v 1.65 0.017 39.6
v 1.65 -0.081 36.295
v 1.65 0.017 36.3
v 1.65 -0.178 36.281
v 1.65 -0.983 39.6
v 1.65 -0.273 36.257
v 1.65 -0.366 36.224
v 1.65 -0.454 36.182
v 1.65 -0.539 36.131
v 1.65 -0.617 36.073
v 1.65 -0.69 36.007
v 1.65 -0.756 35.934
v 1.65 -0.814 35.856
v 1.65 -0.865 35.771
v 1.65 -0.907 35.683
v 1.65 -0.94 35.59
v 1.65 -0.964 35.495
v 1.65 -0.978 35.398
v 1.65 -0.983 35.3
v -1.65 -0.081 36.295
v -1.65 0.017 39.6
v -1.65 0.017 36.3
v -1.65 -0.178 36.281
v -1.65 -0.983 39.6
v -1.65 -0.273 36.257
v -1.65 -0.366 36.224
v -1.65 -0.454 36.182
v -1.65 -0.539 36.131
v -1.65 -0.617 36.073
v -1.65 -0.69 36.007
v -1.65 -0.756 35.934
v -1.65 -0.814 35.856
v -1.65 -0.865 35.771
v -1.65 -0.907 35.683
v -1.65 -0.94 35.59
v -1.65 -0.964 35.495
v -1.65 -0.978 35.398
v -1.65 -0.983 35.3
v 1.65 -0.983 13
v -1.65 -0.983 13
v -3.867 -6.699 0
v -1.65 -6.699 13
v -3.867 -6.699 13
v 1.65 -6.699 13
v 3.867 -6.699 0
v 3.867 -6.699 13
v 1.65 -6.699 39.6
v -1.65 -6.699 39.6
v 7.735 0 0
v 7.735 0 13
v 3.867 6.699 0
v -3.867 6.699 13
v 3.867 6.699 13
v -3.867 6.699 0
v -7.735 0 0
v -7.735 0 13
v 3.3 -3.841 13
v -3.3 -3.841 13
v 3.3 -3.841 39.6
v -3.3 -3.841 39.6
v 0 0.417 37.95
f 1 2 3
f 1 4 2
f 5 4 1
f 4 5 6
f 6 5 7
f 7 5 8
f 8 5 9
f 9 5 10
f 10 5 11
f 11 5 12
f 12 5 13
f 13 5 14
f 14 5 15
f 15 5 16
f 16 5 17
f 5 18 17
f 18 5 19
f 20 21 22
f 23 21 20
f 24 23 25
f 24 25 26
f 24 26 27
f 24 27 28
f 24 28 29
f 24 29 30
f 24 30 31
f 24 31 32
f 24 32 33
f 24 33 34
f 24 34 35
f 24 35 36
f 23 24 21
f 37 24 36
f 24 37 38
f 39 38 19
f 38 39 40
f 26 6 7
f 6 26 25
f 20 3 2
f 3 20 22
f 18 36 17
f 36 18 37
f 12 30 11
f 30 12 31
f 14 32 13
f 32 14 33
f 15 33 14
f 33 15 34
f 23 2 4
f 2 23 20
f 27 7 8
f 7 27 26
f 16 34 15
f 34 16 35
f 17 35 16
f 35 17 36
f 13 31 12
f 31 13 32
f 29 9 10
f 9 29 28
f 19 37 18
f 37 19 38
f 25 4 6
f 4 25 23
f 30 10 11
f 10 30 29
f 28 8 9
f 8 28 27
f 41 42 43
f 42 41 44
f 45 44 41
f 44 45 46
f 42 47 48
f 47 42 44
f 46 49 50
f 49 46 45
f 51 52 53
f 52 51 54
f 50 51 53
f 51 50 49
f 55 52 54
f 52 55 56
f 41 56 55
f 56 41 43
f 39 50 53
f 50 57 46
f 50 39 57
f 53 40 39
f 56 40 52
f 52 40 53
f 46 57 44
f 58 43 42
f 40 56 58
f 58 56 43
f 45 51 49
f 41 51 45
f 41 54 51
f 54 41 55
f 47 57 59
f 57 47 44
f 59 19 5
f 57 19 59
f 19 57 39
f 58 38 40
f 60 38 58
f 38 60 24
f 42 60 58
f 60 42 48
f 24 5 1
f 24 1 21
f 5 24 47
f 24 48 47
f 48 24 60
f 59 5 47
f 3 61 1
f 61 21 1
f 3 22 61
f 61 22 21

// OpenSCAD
/*
Parametric hook for HSW

Copyright 2024 nomike[AT]nomike[DOT]com

Redistribution and use in source and binary forms, with or without
modification, are permitted provided that the following conditions are met:

1. Redistributions of source code must retain the above copyright notice, this
list of conditions and the following disclaimer.

2. Redistributions in binary form must reproduce the above copyright notice,
this list of conditions and the following disclaimer in the documentation
and/or other materials provided with the distribution.

THIS SOFTWARE IS PROVIDED BY THE COPYRIGHT HOLDERS AND CONTRIBUTORS “AS IS” AND
ANY EXPRESS OR IMPLIED WARRANTIES, INCLUDING, BUT NOT LIMITED TO, THE IMPLIED
WARRANTIES OF MERCHANTABILITY AND FITNESS FOR A PARTICULAR PURPOSE ARE
DISCLAIMED. IN NO EVENT SHALL THE COPYRIGHT HOLDER OR CONTRIBUTORS BE LIABLE FOR
ANY DIRECT, INDIRECT, INCIDENTAL, SPECIAL, EXEMPLARY, OR CONSEQUENTIAL DAMAGES
(INCLUDING, BUT NOT LIMITED TO, PROCUREMENT OF SUBSTITUTE GOODS OR SERVICES;
LOSS OF USE, DATA, OR PROFITS; OR BUSINESS INTERRUPTION) HOWEVER CAUSED AND ON
ANY THEORY OF LIABILITY, WHETHER IN CONTRACT, STRICT LIABILITY, OR TORT
(INCLUDING NEGLIGENCE OR OTHERWISE) ARISING IN ANY WAY OUT OF THE USE OF THIS
SOFTWARE, EVEN IF ADVISED OF THE POSSIBILITY OF SUCH DAMAGE.
*/

insert_length = 13;
hook_length = 22.3;
hook_diameter = 6.6;
hook_nose_height = 1;
slope_height = 0.4;

_hook_total_length = hook_length + hook_diameter / 2 + hook_nose_height;


const_hsw_diameter = 15.47; // 15.15 mm hooks slide in and out with ease. 15.47 mm is quite tight.


_hsw_inner_circle_diameter = (sqrt(3) / 2) * const_hsw_diameter;
_hook_inner_circle_radius = (sqrt(3) / 2) * hook_diameter;
echo(_hsw_inner_circle_diameter)
echo(_hook_inner_circle_radius)

// HSW insert
cylinder(d=const_hsw_diameter, h=insert_length, $fn=6);

// Hook
translate([0, 0 - (_hsw_inner_circle_diameter / 2) + (_hook_inner_circle_radius / 2), insert_length]) cylinder(d=hook_diameter, h=_hook_total_length, $fn=6);

// Fillet
difference () {
    translate([-hook_diameter / 4, -_hsw_inner_circle_diameter/2 + _hook_inner_circle_radius, insert_length + _hook_total_length - hook_diameter/2 - min(hook_diameter, hook_nose_height * 2) / 2])
    cube([hook_diameter / 2, min(hook_diameter / 2, hook_nose_height), min(hook_diameter / 2, hook_nose_height)]);
    translate([-hook_diameter / 4, -_hsw_inner_circle_diameter/2 + _hook_inner_circle_radius + min(hook_diameter, hook_nose_height * 2)/2,insert_length + _hook_total_length - hook_diameter/2 - min(hook_diameter, hook_nose_height * 2) / 2])
    rotate([0, 90, 0])cylinder(d=min(hook_diameter, hook_nose_height * 2) , h=hook_diameter/2, $fn=64);
}

// Hook Nose
translate([0, 0 - (_hsw_inner_circle_diameter / 2)  + _hook_inner_circle_radius + hook_nose_height / 2, insert_length + _hook_total_length - hook_diameter / 4])
cube([hook_diameter / 2, hook_nose_height, hook_diameter / 2], center=true);

// Hook Nose Top Pyramid
translate([0, 0 - (_hsw_inner_circle_diameter / 2)  + _hook_inner_circle_radius + hook_nose_height + (slope_height / 2), insert_length + _hook_total_length - hook_diameter / 4])
rotate([90, 45, 0])
cylinder(d2=hook_diameter / 2 * sqrt(2), d1=0, h = slope_height, center=true, $fn=4);
